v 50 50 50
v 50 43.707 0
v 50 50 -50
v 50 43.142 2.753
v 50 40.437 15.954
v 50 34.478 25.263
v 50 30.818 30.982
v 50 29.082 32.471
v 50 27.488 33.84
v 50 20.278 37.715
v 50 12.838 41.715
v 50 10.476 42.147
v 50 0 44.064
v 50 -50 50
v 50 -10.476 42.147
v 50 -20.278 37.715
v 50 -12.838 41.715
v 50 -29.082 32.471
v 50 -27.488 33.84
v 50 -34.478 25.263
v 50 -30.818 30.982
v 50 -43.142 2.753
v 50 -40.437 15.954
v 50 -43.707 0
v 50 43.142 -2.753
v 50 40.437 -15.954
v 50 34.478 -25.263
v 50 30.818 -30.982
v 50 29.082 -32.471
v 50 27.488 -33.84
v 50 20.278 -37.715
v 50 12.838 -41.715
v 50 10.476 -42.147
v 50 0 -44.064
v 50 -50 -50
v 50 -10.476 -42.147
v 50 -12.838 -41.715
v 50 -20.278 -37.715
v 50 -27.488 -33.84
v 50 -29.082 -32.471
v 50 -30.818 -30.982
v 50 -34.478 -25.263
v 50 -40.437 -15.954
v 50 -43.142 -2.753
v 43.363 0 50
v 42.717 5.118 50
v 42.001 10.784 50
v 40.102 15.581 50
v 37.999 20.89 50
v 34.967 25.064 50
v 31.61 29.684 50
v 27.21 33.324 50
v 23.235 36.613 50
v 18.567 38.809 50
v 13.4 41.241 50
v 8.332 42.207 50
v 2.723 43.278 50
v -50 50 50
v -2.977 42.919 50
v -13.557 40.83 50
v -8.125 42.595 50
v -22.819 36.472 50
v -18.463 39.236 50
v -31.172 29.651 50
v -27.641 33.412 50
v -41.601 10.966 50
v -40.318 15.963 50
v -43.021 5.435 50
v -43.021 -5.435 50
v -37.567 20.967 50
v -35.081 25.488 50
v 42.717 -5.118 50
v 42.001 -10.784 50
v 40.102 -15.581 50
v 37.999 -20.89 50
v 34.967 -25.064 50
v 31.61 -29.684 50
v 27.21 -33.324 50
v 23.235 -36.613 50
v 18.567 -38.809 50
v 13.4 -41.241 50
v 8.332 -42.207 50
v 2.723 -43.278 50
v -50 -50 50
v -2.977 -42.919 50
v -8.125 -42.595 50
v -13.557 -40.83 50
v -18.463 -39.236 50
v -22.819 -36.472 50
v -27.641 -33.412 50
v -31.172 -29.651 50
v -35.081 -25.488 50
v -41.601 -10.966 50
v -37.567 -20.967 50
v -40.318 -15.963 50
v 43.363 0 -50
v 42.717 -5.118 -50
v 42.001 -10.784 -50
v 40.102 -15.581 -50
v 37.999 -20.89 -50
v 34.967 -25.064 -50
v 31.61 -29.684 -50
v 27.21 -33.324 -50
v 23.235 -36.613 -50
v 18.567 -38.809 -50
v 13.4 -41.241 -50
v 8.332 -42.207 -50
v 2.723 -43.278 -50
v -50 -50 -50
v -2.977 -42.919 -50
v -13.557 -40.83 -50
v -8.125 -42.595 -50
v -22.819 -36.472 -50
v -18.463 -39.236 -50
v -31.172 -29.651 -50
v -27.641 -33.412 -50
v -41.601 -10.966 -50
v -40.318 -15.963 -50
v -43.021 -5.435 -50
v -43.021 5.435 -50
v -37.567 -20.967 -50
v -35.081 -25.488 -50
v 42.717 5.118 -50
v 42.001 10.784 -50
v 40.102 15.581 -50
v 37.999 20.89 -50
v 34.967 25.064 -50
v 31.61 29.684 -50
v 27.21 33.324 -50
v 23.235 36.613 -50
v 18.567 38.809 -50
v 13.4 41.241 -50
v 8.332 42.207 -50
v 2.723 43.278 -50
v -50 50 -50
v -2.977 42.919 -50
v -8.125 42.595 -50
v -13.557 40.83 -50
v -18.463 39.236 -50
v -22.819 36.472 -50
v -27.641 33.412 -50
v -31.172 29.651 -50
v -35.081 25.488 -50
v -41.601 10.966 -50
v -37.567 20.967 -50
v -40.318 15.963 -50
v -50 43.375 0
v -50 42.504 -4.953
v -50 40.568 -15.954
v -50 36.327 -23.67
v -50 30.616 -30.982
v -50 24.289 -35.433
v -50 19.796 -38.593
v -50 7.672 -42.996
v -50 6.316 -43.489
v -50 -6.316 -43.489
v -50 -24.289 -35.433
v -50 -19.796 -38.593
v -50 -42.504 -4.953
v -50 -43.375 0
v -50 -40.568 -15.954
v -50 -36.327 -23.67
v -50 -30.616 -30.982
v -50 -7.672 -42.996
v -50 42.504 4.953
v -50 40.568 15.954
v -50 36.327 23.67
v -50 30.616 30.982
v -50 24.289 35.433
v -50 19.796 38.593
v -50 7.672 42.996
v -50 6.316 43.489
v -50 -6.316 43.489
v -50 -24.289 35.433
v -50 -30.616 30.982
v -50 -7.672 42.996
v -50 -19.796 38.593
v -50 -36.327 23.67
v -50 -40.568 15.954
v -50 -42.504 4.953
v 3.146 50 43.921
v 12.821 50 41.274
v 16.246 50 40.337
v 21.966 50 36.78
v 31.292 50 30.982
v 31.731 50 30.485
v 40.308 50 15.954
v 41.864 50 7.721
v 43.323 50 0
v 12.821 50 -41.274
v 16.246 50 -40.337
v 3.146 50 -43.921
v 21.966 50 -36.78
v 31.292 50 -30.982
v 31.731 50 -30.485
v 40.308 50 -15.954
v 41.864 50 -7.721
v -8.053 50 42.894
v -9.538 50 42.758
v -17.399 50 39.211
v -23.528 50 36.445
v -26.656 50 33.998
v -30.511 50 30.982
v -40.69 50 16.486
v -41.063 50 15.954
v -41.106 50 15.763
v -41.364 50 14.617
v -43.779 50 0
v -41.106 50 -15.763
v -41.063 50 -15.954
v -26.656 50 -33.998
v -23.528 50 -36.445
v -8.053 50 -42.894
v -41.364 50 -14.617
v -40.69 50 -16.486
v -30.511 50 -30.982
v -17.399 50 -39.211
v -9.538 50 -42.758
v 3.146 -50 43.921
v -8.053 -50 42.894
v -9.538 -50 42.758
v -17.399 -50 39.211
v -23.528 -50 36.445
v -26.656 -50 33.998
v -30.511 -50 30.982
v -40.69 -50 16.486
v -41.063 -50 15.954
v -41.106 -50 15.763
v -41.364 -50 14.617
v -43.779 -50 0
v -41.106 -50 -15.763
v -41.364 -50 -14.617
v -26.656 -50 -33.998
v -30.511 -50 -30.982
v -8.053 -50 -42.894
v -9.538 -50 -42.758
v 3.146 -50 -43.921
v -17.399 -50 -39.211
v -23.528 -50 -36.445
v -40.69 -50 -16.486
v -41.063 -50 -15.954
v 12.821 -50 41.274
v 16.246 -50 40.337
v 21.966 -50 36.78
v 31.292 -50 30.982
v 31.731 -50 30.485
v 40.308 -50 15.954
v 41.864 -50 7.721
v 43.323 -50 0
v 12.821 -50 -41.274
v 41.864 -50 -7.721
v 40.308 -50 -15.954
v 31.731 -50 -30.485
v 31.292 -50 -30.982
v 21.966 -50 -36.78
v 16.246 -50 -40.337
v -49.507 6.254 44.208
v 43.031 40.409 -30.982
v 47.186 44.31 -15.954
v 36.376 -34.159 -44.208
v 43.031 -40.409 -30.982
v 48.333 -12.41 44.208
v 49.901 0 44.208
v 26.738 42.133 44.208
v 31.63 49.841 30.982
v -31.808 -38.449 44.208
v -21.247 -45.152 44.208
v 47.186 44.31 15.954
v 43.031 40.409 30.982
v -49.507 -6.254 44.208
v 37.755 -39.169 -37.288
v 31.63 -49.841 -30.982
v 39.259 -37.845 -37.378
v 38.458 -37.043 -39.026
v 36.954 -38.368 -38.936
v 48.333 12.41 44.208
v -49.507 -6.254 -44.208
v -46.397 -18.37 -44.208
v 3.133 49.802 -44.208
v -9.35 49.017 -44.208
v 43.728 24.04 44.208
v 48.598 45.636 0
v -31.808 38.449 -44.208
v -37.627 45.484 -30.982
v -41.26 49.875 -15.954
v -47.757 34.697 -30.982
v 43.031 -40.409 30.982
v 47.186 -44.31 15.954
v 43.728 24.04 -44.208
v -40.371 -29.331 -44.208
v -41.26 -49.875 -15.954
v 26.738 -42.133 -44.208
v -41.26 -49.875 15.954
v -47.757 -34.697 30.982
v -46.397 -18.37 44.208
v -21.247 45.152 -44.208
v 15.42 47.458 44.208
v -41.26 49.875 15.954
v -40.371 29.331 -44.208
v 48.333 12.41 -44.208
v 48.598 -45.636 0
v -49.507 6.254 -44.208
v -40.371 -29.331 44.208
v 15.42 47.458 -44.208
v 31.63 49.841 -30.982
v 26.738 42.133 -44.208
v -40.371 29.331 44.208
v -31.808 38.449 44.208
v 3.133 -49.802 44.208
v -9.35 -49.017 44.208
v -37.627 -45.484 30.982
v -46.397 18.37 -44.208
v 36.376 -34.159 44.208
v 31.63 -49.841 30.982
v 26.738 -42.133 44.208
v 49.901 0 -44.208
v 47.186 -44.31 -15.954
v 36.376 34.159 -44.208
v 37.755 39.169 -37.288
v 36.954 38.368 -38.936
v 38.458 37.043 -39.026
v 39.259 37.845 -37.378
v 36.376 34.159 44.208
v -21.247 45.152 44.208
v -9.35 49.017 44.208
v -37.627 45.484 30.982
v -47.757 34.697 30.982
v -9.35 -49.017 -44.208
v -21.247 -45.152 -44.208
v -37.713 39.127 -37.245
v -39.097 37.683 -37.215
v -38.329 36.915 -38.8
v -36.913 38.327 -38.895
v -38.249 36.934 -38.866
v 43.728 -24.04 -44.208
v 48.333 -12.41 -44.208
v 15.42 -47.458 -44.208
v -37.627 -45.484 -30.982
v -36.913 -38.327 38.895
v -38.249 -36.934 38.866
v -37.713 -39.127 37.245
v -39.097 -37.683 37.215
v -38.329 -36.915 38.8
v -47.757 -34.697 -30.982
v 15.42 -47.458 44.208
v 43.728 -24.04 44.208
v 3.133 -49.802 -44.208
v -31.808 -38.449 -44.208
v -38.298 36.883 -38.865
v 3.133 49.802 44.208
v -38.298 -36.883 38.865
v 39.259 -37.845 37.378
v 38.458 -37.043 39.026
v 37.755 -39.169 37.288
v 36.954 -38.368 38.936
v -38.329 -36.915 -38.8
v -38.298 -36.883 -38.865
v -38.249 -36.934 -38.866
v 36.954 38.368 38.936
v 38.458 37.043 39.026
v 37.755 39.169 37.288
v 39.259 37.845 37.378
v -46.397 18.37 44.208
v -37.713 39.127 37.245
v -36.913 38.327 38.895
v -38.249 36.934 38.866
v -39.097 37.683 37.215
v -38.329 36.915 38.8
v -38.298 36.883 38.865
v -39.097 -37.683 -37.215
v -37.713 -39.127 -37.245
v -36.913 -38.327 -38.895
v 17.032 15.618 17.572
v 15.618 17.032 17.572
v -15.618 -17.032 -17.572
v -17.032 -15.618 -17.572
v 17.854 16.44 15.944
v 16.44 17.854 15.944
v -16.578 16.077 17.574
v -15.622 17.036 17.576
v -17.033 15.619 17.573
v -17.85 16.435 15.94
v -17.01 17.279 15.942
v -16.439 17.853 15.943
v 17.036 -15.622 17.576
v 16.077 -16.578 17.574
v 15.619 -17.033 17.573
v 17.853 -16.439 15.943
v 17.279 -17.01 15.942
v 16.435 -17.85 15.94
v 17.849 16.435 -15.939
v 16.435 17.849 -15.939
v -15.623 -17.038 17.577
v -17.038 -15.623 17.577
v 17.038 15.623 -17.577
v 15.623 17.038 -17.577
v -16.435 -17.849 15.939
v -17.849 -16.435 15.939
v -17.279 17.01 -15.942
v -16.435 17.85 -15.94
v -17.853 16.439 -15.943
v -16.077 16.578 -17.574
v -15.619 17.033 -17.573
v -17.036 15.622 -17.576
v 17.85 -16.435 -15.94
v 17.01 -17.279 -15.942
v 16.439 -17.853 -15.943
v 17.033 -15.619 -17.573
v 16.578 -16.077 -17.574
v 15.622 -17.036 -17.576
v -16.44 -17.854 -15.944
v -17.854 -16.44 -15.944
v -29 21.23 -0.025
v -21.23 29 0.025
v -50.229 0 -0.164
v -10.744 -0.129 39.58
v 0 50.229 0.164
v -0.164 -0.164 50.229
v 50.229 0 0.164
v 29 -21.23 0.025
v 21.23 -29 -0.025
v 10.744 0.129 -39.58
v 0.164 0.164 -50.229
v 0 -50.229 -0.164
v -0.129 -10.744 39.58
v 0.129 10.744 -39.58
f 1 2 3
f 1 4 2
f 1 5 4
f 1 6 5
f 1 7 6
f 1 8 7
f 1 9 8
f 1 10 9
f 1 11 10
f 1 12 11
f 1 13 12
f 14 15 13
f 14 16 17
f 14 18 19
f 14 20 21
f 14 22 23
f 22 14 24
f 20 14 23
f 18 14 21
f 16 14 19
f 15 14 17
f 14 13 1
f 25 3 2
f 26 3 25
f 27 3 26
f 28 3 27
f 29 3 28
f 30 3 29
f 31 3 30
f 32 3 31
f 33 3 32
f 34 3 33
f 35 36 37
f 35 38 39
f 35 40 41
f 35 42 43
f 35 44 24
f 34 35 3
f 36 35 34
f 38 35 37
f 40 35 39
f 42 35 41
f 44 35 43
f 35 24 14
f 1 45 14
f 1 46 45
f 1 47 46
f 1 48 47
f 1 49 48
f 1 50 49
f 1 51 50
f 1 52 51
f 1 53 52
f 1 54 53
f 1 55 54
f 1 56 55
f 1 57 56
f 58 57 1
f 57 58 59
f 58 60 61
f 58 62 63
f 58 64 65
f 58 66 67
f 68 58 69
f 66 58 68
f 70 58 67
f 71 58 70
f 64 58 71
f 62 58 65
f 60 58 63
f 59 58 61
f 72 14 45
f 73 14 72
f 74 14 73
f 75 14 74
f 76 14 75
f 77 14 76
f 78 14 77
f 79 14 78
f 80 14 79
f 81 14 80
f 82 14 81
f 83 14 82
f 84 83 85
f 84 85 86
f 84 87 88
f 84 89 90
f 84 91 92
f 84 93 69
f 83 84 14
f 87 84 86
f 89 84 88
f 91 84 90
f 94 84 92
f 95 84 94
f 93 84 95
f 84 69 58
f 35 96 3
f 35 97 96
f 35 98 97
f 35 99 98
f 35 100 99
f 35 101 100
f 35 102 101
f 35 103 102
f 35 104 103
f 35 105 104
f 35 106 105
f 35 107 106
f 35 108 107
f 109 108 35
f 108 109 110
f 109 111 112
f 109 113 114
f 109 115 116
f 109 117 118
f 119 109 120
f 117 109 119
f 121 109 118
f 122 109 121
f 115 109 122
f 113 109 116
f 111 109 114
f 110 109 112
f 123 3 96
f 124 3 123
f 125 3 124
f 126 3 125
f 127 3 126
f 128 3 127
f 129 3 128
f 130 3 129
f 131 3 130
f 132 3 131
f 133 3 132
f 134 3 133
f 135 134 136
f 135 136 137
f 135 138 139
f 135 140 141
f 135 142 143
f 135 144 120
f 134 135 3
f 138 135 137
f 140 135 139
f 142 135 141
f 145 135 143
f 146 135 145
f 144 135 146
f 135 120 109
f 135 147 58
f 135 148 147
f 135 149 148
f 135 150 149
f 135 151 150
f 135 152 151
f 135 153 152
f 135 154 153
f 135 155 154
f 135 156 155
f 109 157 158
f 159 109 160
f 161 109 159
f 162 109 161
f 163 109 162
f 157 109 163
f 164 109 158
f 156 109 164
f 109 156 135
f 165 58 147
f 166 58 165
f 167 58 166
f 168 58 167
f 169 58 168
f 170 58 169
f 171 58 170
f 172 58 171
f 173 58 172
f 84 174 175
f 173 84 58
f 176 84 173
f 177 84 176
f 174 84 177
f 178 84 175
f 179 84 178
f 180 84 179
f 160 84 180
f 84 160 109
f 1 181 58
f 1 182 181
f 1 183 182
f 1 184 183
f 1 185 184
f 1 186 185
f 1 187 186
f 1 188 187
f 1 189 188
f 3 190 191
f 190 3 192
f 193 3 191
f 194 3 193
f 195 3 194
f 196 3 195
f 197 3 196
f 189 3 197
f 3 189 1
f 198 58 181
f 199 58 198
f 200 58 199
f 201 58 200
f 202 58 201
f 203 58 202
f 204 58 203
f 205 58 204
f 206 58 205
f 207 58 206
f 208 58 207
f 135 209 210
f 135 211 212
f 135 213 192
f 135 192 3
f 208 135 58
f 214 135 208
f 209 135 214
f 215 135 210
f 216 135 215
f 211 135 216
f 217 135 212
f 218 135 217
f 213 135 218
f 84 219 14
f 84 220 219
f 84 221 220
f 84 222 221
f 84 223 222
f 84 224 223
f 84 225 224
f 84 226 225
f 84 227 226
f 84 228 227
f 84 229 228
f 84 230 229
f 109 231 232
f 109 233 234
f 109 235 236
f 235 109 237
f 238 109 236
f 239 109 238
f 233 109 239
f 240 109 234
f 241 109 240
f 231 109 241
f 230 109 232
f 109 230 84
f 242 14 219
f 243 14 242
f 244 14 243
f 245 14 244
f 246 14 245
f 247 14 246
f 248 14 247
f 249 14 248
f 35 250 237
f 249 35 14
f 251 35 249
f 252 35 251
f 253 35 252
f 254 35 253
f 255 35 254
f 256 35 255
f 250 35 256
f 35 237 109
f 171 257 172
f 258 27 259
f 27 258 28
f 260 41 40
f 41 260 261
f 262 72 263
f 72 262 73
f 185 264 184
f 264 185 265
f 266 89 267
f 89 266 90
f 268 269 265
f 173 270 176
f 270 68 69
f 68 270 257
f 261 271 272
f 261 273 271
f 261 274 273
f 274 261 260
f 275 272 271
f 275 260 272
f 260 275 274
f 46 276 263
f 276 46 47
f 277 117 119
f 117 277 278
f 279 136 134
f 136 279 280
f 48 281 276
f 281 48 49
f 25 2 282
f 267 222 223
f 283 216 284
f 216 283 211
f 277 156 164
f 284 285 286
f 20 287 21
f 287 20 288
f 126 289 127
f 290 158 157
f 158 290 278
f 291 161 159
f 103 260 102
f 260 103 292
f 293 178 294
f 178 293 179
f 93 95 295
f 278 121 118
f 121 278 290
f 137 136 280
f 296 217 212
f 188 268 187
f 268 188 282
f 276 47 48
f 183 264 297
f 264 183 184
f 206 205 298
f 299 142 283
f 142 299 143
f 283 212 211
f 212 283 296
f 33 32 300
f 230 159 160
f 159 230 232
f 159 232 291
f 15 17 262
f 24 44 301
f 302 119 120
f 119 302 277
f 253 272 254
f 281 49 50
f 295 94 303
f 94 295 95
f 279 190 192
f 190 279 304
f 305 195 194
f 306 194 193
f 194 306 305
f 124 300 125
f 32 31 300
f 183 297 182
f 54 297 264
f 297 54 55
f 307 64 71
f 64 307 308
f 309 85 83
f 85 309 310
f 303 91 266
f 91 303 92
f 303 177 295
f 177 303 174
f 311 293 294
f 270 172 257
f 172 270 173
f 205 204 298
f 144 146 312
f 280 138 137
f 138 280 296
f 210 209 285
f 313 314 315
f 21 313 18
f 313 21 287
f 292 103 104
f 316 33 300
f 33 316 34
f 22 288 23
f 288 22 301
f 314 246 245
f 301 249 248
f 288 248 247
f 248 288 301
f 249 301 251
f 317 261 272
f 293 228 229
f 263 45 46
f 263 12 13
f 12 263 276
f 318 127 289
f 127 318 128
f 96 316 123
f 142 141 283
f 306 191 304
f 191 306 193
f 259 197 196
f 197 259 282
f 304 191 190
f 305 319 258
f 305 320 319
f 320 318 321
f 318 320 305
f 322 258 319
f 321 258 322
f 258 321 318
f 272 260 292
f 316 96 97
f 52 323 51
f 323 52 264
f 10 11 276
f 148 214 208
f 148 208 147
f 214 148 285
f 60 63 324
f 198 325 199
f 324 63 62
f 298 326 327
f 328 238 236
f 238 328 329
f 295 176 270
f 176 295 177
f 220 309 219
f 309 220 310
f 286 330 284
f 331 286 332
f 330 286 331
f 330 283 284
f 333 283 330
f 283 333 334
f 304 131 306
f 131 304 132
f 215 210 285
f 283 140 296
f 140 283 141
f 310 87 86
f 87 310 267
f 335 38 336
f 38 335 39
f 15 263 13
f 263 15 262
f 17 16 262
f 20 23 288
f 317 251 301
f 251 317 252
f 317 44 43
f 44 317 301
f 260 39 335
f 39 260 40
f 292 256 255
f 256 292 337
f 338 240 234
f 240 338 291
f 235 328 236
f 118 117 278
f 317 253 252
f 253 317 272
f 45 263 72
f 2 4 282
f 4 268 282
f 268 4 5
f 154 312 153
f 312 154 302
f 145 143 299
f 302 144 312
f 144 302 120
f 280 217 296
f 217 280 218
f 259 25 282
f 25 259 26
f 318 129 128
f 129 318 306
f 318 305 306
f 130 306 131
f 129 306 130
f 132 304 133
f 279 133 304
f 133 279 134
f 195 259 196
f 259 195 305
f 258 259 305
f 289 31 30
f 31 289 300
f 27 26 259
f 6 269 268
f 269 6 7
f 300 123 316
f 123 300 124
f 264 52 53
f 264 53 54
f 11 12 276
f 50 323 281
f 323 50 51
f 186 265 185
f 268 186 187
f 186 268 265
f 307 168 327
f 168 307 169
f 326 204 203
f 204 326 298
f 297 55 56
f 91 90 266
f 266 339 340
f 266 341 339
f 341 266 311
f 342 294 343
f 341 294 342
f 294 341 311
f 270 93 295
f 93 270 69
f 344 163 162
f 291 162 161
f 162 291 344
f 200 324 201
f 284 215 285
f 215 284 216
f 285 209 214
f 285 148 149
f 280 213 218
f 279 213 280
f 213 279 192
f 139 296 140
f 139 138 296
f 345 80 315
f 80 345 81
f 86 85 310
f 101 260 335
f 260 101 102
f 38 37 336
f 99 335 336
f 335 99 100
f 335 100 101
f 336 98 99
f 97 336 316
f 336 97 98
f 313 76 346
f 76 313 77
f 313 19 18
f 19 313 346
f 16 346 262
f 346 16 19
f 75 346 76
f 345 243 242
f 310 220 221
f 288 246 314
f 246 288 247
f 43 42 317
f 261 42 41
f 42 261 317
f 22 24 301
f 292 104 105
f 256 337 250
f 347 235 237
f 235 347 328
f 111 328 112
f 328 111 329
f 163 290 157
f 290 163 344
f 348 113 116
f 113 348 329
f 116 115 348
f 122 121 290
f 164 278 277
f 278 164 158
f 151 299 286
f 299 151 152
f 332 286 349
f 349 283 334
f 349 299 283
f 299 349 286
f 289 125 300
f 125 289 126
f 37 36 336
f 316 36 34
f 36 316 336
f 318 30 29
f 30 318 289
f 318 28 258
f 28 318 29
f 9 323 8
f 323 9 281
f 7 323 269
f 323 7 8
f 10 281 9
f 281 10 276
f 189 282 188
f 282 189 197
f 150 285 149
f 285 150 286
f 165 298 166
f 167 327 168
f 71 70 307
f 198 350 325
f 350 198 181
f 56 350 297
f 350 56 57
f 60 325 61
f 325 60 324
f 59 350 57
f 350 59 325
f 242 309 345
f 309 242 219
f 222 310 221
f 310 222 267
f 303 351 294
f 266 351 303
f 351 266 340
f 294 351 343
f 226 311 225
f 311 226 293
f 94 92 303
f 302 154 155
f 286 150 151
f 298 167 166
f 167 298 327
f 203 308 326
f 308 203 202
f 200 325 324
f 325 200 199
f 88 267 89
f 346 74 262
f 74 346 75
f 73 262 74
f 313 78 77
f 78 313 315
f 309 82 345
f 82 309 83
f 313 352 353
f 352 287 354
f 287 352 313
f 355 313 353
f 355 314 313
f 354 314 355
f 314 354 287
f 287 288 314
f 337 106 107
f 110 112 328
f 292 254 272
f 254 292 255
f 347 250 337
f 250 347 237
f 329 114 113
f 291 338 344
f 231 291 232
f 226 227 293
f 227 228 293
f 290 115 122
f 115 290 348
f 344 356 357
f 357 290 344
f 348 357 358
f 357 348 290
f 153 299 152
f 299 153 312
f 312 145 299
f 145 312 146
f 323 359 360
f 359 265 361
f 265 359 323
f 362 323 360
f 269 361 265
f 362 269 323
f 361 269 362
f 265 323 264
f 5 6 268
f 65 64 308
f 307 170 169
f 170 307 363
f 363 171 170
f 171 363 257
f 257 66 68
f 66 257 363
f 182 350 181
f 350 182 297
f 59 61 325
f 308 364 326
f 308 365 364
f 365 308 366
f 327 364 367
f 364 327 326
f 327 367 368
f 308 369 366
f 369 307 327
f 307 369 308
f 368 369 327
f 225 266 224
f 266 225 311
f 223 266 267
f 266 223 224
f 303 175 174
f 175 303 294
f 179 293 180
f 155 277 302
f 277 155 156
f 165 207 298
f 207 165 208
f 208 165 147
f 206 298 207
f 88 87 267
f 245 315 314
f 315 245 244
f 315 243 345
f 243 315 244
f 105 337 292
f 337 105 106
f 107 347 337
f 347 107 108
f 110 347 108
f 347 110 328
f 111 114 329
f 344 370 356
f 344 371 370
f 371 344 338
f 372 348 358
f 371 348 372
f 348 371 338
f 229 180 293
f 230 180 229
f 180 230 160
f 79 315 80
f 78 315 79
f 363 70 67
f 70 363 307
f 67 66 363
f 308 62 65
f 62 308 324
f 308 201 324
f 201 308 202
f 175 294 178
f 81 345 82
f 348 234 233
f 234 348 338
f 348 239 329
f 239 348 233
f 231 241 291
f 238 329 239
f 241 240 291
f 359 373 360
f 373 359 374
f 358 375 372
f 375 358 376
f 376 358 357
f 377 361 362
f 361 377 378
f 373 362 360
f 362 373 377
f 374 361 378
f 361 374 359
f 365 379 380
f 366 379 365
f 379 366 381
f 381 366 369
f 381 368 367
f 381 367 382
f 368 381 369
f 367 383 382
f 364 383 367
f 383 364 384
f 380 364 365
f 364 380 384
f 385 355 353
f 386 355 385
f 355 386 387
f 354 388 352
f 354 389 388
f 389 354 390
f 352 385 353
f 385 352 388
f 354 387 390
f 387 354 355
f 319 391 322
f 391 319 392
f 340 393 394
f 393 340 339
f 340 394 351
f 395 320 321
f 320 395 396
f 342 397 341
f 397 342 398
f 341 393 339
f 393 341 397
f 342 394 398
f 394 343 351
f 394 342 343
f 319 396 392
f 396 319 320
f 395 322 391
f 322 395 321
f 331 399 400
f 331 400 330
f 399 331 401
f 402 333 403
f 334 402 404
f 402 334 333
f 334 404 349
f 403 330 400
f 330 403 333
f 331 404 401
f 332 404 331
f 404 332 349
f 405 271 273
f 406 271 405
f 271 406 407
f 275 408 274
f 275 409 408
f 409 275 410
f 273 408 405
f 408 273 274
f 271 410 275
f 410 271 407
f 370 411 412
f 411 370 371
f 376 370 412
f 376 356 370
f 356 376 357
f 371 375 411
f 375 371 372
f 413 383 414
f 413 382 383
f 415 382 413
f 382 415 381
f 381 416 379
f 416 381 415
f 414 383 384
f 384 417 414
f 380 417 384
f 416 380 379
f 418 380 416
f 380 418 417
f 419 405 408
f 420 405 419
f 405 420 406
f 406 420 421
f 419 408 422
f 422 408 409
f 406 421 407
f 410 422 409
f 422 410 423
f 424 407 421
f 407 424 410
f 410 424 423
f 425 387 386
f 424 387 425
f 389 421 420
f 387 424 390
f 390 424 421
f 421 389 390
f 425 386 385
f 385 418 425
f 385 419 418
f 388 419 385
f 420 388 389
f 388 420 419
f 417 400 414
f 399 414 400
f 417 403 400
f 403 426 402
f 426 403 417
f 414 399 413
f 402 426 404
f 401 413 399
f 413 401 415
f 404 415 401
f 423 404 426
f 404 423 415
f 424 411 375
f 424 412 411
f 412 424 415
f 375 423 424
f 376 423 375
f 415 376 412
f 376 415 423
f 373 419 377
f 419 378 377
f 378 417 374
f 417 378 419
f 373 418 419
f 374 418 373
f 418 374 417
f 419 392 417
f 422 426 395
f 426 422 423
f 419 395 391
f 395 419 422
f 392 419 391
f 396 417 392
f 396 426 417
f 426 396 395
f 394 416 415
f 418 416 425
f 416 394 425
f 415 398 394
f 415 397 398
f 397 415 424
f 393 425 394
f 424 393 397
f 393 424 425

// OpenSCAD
// file: solidlib.scad
module opencube(size) {
    difference() {
        cube(size, center=true);
        sphere(size*2/3);
    }
}

module box() {
    cube([2, 2, 1], center = true); 
}


module octahedron(size) {
    rotate([125,0,135]) 
      scale(size) {
        dihedral = 109.47122;
        n = 3;
        intersection(){
            box();
            intersection_for(i=[1:n])  { 
                rotate([dihedral, 0, 360 /n * i])  box(); 
           }
        }
    }
}

module openoctahedron(size) {
    difference() {
        octahedron(size);
        sphere(size*0.57);
    }
}


module mesh_star(size, n) {
    scale(size/10) {
        for( i = [0 : n] ) {
            rotate([i * 180 / n,0,0]) cylinder(10, 0.1, 0.1, center=true);
        }
    }
}

module cubemesh(size, cnt) {
    intersection() {
        for( rot = [[0,0,0],[0,90,0], [0,0,90]]) {
            rotate(rot) {
                translate([size/2,0,0]) mesh_star(size, cnt);
                translate([-size/2,0,0]) mesh_star(size, cnt);
            }
        }
        cube(size, center=true);
    }
}

module cubecorners(outer,inner) {
    th = 35.3;
    intersection() {
        for( rot = [
                    [0,-th,45], [0,-th,135], [0,-th,-45], [0,-th,-135],
                    [0,th,45], [0,th,135], [0,th,-45], [0,th,-135],
        ]) {
            rotate(rot) {
                translate([0,-1,-1])
                  cube([outer,2,2]);
            }
        }
        cube(outer, center=true);
    }
}

module octacorners(outer,inner) {
    for( rot = [
            [0,0,0], [0,90,0], [0,0,90],
            [0,180,0], [0,270,0], [0,0,270],
    ]) {
        rotate(rot) {
            translate([0,-1,-1])
              cube([outer,2,2]);
        }
    }
}


module octamesh(size) {
  // TODO
}



module dodecahedron() {
      dihedral = 116.565;
      intersection(){
            box();
            intersection_for(i=[1:5])  { 
                rotate([dihedral, 0, 360 / 5 * i])  box(); 
           }
      }
}

module opendodecahedron() {
    difference() {
        dodecahedron();
        sphere(0.56);
    }
}

module icosahedron(a = 2) {
    rotate([0,31.5,17]) scale(0.1) {
        phi = a * ((1 + sqrt(5)) / 2);
        polyhedron(
            points = [
                [0,-phi, a], [0, phi, a], [0, phi, -a], [0, -phi, -a], [a, 0, phi], [-a, 0, phi], [-a, 0, -phi], 
                [a, 0, -phi], [phi, a, 0], [-phi, a, 0], [-phi, -a, 0], [phi, -a, 0]    
            ],
            faces = [
                [0,5,4], [0,4,11], [11,4,8], [11,8,7], [4,5,1], [4,1,8], [8,1,2], [8,2,7], [1,5,9], [1,9,2], [2,9,6], [2,6,7], [9,5,10], [9,10,6], [6,10,3], [6,3,7], [10,5,0], [10,0,3], [3,0,11], [3,11,7]
            ]
        
        );
    }
}

module openicosahedron() {
    difference() {
        icosahedron();
        sphere(0.316);
    }
}


module mesh_star(size, n, offset=0.333) {
    scale(size/10) {
        for( i = [0 : n] ) {
            rotate([(offset + i) * 360 / n,0,0]) { 
                translate([0,0,0])
                cylinder(5, 0.1, 0.1);
            }
        }
    }
}

module dodecamesh(cnt) {
    intersection() {
        for( rot = [[0,90,0],
                    [0,-26,18], [0,-26,18+72], [0,-26,18+2*72],
                    [0,-26,18+3*72], [0,-26,18+4*72], 
        ]) {
            rotate(rot) {
                translate([0.5,0,0]) mesh_star(0.6, cnt);
                translate([-0.5,0,0]) mesh_star(0.6, cnt);
            }
        }
        dodecahedron(center=true);
    }
}

module icosamesh(cnt) {
    intersection() {
        h = 10;
        j = 53;
        for( rot = [
                    [0,h,18], [0,h,18+72], [0,h,18+2*72], [0,h,18+3*72], [0,h,18+4*72], 
                    [0,j,18], [0,j,18+72], [0,j,18+2*72], [0,j,18+3*72], [0,j,18+4*72], 
        
        ]) {
            rotate(rot) {
                translate([0.3,0,0]) mesh_star(0.25, cnt);
                translate([-0.3,0,0]) mesh_star(0.25, cnt);
            }
        }
        icosahedron(center=true);
    }
}
// main file
use <solidlib.scad>

$fn = 25;

opencube(100);
cubecorners(100, 58);
octahedron(58);

//openoctahedron(58);
//opencube(34);
//openoctahedron(20);

//opencubenomesh(12);
